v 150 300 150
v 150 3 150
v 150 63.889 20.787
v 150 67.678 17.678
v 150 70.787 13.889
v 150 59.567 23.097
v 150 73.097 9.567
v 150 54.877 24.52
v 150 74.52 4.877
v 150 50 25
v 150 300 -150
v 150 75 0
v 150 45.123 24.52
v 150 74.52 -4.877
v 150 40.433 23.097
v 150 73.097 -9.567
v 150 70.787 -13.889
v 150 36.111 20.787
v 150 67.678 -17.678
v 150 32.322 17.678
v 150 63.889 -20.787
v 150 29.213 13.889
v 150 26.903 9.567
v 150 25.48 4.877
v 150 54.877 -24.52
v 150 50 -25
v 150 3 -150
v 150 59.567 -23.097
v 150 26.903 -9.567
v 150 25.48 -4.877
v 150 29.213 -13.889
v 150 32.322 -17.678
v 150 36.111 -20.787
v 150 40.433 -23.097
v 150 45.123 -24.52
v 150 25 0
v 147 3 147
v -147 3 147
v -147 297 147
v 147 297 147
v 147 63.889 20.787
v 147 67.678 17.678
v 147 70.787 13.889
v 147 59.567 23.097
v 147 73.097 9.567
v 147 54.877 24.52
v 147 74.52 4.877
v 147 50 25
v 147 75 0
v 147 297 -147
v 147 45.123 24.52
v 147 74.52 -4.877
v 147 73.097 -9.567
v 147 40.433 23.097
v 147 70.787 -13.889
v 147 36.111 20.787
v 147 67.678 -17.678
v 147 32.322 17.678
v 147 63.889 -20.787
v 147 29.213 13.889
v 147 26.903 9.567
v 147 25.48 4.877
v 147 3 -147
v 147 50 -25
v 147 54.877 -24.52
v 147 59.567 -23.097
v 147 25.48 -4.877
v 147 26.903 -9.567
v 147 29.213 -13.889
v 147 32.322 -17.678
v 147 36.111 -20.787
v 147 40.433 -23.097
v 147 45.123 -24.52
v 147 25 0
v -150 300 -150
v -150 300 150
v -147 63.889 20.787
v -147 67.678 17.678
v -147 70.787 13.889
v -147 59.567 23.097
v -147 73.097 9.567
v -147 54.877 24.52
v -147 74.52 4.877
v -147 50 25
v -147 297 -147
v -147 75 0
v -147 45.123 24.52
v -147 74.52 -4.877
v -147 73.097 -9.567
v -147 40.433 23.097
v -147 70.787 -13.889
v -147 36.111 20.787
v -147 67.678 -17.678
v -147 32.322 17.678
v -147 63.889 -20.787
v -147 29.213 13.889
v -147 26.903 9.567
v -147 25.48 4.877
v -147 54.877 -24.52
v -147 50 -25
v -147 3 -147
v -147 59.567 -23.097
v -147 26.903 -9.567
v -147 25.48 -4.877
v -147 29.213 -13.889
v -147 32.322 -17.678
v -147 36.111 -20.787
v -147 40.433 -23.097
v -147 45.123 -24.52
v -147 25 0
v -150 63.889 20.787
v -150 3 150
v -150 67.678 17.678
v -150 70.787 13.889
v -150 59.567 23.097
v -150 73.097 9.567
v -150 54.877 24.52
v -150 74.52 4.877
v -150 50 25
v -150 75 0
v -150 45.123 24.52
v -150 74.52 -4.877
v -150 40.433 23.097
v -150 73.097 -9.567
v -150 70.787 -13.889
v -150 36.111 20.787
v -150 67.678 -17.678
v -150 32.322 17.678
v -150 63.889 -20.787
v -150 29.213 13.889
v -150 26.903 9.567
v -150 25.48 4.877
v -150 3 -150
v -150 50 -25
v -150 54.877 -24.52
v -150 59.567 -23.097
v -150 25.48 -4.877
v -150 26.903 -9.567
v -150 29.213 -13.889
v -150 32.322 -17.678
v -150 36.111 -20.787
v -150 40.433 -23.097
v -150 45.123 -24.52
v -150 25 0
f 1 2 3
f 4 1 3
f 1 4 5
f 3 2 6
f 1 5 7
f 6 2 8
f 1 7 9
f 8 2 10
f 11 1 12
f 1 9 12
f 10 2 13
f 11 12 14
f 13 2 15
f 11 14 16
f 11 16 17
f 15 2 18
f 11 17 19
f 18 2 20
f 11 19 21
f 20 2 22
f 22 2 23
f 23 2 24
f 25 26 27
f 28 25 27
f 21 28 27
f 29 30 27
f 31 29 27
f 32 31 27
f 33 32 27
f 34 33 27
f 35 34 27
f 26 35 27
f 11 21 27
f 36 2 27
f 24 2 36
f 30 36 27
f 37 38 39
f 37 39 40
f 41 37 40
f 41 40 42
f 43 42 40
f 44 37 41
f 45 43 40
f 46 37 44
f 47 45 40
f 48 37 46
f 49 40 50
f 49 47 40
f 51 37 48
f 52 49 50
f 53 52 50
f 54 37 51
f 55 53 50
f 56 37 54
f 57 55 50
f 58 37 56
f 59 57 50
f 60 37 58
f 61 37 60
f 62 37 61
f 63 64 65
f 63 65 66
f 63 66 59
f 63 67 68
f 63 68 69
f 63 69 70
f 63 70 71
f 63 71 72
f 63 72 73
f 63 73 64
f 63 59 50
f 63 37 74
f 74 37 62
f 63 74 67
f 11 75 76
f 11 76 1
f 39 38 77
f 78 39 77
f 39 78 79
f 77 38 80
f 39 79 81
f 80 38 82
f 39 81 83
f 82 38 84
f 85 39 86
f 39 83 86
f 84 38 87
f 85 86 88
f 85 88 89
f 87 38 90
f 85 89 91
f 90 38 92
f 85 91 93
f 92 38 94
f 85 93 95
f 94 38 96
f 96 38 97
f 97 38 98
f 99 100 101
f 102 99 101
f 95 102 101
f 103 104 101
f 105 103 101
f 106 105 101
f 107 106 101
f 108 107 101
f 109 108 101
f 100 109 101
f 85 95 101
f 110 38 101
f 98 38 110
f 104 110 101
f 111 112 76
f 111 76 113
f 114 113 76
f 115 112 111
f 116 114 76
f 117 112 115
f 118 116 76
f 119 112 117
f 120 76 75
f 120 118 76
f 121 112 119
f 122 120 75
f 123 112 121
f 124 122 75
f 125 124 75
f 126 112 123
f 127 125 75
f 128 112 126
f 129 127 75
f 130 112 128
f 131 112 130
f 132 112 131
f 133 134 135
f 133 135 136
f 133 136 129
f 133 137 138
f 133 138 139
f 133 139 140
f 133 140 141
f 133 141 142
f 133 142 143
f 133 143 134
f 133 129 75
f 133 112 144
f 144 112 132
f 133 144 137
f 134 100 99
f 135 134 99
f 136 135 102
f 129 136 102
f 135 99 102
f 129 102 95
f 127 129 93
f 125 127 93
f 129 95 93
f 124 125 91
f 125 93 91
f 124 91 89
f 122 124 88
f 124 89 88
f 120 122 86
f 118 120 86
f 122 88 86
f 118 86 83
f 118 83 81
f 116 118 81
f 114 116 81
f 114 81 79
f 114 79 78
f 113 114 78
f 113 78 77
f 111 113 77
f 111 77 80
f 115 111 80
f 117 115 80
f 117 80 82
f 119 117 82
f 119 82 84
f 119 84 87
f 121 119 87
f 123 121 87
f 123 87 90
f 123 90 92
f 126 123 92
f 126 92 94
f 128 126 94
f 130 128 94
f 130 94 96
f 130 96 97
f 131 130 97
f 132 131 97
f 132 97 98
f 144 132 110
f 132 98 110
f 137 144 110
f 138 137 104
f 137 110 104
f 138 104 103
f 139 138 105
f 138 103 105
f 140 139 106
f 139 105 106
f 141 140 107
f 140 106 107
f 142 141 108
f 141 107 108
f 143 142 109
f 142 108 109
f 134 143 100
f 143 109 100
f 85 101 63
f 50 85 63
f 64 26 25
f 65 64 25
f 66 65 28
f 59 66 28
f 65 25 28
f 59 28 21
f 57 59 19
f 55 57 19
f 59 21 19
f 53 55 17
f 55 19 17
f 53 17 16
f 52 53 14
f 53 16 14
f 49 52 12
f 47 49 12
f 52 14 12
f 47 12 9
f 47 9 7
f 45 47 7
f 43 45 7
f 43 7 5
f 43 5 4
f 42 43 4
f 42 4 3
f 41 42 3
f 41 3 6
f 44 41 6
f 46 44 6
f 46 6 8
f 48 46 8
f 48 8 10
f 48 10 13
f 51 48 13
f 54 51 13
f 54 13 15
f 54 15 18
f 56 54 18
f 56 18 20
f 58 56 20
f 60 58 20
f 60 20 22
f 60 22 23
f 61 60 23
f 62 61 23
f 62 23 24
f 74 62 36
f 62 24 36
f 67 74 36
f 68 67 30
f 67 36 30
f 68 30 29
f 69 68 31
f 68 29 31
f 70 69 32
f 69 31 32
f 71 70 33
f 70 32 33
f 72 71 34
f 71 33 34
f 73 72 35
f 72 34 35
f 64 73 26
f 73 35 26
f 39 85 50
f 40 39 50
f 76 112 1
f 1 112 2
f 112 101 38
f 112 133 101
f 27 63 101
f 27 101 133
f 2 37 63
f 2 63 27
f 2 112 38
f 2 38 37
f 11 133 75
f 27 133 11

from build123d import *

# Parameters (mm, degrees)
SKETCH1_W               = 300
SKETCH1_H               = 300
BOSS_EXTRUDE1_DEPTH     = 3
SKETCH2_W               = 300
SKETCH2_H               = 300
SKETCH2_W_2             = 294
SKETCH2_H_2             = 294
BOSS_EXTRUDE2_DEPTH     = 297
SKETCH3_W               = 300
SKETCH3_H               = 300
BOSS_EXTRUDE3_DEPTH     = 3
SKETCH4_R               = 25
CUT_EXTRUDE1_DEPTH      = 1
CUT_EXTRUDE1_DEPTH_BACK = 301
SKETCH5_W               = 300
SKETCH5_H               = 300
CUT_EXTRUDE2_DEPTH      = 3


with BuildPart() as part:
    # Sketch1 → Boss-Extrude1 (new body)
    with BuildSketch(Plane(origin=(0, 0, 0), x_dir=(1, 0, 0), z_dir=(0, 1, 0))):
        Rectangle(SKETCH1_W, SKETCH1_H)
    extrude(amount=BOSS_EXTRUDE1_DEPTH)

    # Sketch2 → Boss-Extrude2 (add)
    with BuildSketch(Plane(origin=(0, 3, 0), x_dir=(1, 0, 0), z_dir=(0, 1, 0))):
        Rectangle(SKETCH2_W, SKETCH2_H)
        Rectangle(SKETCH2_W_2, SKETCH2_H_2, mode=Mode.SUBTRACT)
    extrude(amount=BOSS_EXTRUDE2_DEPTH)

    # Sketch3 → Boss-Extrude3 (add)
    with BuildSketch(Plane(origin=(0, 300, 0), x_dir=(1, 0, 0), z_dir=(0, 1, 0))):
        Rectangle(SKETCH3_W, SKETCH3_H)
    extrude(amount=-BOSS_EXTRUDE3_DEPTH)

    # Sketch4 → Cut-Extrude1 (cut, two sides)
    with BuildSketch(Plane(origin=(150, 0, 0), x_dir=(0, 0, -1), z_dir=(1, 0, 0))) as cut_extrude1_sk:
        with Locations((0, 50)):
            Circle(SKETCH4_R)
    extrude(amount=CUT_EXTRUDE1_DEPTH, mode=Mode.SUBTRACT)
    extrude(cut_extrude1_sk.sketch, amount=-CUT_EXTRUDE1_DEPTH_BACK, mode=Mode.SUBTRACT)

    # Sketch5 → Cut-Extrude2 (cut)
    with BuildSketch(Plane.XZ):
        Rectangle(SKETCH5_W, SKETCH5_H)
    extrude(amount=-CUT_EXTRUDE2_DEPTH, mode=Mode.SUBTRACT)


solid = part.part
